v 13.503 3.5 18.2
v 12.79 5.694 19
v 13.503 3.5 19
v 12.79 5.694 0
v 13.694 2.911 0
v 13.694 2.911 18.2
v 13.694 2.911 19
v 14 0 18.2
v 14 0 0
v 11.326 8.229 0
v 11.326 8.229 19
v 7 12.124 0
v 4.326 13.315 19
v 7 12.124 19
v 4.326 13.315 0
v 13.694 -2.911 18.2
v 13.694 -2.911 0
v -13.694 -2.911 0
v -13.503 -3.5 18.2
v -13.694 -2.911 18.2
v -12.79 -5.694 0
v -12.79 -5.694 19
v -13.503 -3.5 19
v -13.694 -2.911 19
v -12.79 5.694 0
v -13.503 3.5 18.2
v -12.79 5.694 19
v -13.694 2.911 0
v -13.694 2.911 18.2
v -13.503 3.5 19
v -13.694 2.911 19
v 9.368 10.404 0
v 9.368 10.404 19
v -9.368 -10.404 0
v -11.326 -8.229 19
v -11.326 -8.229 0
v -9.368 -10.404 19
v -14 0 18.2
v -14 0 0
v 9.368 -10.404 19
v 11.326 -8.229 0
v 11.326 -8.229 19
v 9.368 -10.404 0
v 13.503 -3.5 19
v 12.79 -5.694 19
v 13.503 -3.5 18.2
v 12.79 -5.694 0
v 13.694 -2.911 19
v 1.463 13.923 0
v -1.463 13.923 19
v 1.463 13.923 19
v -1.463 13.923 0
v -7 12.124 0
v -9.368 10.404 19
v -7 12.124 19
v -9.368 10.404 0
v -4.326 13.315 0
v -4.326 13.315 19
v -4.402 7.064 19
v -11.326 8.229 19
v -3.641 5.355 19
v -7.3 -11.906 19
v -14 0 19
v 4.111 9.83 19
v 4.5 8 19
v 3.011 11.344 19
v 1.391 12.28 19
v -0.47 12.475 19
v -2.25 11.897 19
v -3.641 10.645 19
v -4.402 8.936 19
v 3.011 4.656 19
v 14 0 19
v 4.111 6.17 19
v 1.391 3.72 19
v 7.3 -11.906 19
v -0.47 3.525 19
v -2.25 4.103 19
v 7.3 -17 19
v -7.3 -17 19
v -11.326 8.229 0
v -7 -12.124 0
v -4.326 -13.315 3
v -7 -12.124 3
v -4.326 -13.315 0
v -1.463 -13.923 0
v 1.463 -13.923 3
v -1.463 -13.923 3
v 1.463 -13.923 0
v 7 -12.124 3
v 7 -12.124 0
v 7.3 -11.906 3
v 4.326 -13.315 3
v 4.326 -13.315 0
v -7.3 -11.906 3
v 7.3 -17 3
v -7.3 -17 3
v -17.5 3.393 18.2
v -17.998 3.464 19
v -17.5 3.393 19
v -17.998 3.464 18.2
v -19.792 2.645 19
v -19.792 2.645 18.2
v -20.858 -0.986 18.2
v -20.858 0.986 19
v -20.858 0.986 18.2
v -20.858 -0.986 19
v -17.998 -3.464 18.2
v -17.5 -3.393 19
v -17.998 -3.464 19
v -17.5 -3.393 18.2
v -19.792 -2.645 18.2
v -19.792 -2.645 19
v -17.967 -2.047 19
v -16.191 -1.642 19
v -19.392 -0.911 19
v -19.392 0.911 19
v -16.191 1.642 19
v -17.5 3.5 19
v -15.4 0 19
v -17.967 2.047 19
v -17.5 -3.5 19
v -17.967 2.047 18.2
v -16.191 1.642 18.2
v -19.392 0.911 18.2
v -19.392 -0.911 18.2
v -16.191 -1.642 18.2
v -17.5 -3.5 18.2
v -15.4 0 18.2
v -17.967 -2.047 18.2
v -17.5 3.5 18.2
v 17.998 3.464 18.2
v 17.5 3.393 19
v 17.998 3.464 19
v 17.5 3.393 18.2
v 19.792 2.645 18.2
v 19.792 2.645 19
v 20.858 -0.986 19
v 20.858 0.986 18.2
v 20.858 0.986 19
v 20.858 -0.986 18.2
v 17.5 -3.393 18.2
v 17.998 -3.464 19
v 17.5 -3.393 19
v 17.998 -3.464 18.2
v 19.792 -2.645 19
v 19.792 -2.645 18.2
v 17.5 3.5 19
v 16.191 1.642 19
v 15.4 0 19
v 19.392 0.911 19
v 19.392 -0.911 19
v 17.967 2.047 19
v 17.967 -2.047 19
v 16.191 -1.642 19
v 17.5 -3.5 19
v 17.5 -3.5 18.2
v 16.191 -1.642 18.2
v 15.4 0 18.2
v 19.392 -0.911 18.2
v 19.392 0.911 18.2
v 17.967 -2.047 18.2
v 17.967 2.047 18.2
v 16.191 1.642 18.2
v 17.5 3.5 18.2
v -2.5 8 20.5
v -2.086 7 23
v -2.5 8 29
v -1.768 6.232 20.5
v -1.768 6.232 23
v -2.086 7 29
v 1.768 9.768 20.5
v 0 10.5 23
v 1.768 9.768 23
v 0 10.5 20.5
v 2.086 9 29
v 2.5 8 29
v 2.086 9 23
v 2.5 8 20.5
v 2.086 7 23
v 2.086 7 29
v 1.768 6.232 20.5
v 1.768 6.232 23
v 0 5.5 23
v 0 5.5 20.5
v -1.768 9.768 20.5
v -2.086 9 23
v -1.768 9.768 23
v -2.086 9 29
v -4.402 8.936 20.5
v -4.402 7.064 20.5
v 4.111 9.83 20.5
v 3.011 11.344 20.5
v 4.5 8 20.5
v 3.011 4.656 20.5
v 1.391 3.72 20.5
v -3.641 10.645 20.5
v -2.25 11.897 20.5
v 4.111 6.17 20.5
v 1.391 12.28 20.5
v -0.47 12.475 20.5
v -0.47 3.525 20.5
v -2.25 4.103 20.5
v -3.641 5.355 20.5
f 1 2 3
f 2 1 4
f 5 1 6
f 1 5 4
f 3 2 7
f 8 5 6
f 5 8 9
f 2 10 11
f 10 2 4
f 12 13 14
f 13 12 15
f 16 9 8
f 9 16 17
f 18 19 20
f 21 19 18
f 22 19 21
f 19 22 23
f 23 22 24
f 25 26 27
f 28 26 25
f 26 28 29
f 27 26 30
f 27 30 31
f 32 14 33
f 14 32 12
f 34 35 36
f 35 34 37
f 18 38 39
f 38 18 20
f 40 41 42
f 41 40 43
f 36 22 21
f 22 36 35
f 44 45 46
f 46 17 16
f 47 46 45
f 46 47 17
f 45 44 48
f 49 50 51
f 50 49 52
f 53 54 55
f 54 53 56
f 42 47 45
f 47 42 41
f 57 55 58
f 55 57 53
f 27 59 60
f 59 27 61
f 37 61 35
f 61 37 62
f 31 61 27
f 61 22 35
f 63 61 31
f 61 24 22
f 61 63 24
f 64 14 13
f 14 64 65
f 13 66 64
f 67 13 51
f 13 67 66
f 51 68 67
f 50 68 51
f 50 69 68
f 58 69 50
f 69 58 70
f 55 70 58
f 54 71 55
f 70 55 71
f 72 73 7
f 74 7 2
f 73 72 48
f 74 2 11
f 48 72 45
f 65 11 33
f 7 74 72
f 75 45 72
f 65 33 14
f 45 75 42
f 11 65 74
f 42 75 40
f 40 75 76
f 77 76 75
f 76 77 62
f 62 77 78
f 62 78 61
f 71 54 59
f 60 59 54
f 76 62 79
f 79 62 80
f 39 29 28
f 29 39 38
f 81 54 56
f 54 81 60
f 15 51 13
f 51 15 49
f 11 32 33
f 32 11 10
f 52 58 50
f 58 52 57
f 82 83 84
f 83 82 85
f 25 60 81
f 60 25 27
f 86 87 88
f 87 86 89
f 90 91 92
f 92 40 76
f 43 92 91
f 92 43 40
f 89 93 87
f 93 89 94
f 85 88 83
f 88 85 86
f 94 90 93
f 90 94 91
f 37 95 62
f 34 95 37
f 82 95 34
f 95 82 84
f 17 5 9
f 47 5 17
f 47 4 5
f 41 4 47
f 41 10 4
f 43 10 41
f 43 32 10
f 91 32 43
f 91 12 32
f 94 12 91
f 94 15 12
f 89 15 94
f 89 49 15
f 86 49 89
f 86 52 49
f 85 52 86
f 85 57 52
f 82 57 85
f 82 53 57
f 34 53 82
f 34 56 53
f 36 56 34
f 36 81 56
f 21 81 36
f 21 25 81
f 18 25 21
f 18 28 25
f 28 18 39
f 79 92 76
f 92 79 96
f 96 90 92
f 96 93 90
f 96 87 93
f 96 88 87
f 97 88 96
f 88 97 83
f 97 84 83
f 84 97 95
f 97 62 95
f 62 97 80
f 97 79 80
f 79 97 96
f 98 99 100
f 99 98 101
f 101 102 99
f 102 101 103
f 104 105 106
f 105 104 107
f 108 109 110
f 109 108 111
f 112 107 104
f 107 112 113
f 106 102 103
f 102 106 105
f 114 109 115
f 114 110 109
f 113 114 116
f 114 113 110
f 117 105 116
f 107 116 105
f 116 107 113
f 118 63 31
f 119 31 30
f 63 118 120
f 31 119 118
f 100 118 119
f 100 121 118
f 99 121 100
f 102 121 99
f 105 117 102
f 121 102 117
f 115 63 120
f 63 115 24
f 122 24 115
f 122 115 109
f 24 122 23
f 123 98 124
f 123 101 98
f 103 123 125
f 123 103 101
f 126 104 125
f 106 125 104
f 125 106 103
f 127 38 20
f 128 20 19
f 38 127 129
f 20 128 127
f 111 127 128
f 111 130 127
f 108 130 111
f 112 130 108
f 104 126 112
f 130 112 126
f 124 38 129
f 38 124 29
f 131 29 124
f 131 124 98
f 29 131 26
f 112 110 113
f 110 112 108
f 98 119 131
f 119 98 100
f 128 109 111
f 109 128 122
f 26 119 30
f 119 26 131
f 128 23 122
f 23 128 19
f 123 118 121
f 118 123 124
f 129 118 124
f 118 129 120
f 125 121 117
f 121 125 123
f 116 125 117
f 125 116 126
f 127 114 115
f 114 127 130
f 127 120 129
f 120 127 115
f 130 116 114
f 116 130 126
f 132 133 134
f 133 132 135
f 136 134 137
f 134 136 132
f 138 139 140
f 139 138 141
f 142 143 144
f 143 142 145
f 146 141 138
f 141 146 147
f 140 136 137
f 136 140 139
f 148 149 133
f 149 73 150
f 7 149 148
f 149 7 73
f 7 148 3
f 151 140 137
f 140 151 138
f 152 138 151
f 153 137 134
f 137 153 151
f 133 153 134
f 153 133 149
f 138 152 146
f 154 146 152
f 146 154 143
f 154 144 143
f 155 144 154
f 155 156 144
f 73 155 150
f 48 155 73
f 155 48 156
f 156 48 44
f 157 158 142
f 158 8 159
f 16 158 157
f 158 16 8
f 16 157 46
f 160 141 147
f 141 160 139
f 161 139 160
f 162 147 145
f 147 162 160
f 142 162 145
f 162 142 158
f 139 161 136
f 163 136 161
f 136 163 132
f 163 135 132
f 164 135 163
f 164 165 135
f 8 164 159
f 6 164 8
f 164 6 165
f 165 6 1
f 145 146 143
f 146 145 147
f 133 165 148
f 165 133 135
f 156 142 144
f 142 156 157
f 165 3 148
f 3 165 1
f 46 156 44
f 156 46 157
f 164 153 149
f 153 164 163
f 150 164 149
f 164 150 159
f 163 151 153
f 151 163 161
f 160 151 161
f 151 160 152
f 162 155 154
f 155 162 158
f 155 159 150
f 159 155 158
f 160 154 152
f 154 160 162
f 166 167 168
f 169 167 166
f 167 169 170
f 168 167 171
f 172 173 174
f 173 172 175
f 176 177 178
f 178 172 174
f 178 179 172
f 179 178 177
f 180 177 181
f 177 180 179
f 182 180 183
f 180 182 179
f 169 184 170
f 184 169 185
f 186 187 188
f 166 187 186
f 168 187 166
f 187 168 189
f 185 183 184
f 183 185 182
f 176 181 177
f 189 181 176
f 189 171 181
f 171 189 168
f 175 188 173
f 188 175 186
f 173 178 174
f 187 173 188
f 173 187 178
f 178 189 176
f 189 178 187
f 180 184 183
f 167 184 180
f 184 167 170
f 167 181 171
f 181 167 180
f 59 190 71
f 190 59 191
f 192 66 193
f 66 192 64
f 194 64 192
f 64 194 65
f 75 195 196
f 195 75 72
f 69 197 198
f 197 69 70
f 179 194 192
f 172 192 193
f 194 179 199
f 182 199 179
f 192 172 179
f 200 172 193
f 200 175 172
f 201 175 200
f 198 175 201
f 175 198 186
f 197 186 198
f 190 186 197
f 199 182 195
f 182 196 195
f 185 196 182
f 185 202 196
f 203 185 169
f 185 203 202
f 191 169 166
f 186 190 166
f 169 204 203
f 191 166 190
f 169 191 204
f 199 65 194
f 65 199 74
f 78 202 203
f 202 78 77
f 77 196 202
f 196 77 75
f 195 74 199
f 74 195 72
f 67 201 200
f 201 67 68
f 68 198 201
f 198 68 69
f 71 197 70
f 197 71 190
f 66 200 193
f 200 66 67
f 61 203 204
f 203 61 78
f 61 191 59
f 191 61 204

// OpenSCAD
module body()
{
    union()
    {
        cylinder(h = 19, d = 28, center = [0,0,0]);
        translate([-14.6/2,-17,19-16]) cube([14.6,17,16]);
    }
}

module ear()
{
    translate([-35/2,0,19-0.8/2])
    {
        difference()
        {
            union()
            {
                cylinder(h=0.8, d=7, center=true);
                translate([0,-7/2,-0.8/2])
                {
                    cube([7,7,0.8]);
                }
            }
            cylinder(h=0.8+0.1, d=4.2, center=true);
        }
    }
}

module axis()
{
    translate([0,8,19])
    {
        cylinder(h=1.5, d=9);
        difference()
        {
            cylinder(h=10, d=5);
            translate([-3,(+5-3)/2,4]) cube([3*2,2,6]);
            translate([-3,(-5+3)/2-2,4]) cube([3*2,2,6]);
        }
    }
}

module stepper_28BYJ_48()
{
    body();
    ear();
    mirror(v=[-1,0,0]) ear();
    axis();
}

stepper_28BYJ_48();
